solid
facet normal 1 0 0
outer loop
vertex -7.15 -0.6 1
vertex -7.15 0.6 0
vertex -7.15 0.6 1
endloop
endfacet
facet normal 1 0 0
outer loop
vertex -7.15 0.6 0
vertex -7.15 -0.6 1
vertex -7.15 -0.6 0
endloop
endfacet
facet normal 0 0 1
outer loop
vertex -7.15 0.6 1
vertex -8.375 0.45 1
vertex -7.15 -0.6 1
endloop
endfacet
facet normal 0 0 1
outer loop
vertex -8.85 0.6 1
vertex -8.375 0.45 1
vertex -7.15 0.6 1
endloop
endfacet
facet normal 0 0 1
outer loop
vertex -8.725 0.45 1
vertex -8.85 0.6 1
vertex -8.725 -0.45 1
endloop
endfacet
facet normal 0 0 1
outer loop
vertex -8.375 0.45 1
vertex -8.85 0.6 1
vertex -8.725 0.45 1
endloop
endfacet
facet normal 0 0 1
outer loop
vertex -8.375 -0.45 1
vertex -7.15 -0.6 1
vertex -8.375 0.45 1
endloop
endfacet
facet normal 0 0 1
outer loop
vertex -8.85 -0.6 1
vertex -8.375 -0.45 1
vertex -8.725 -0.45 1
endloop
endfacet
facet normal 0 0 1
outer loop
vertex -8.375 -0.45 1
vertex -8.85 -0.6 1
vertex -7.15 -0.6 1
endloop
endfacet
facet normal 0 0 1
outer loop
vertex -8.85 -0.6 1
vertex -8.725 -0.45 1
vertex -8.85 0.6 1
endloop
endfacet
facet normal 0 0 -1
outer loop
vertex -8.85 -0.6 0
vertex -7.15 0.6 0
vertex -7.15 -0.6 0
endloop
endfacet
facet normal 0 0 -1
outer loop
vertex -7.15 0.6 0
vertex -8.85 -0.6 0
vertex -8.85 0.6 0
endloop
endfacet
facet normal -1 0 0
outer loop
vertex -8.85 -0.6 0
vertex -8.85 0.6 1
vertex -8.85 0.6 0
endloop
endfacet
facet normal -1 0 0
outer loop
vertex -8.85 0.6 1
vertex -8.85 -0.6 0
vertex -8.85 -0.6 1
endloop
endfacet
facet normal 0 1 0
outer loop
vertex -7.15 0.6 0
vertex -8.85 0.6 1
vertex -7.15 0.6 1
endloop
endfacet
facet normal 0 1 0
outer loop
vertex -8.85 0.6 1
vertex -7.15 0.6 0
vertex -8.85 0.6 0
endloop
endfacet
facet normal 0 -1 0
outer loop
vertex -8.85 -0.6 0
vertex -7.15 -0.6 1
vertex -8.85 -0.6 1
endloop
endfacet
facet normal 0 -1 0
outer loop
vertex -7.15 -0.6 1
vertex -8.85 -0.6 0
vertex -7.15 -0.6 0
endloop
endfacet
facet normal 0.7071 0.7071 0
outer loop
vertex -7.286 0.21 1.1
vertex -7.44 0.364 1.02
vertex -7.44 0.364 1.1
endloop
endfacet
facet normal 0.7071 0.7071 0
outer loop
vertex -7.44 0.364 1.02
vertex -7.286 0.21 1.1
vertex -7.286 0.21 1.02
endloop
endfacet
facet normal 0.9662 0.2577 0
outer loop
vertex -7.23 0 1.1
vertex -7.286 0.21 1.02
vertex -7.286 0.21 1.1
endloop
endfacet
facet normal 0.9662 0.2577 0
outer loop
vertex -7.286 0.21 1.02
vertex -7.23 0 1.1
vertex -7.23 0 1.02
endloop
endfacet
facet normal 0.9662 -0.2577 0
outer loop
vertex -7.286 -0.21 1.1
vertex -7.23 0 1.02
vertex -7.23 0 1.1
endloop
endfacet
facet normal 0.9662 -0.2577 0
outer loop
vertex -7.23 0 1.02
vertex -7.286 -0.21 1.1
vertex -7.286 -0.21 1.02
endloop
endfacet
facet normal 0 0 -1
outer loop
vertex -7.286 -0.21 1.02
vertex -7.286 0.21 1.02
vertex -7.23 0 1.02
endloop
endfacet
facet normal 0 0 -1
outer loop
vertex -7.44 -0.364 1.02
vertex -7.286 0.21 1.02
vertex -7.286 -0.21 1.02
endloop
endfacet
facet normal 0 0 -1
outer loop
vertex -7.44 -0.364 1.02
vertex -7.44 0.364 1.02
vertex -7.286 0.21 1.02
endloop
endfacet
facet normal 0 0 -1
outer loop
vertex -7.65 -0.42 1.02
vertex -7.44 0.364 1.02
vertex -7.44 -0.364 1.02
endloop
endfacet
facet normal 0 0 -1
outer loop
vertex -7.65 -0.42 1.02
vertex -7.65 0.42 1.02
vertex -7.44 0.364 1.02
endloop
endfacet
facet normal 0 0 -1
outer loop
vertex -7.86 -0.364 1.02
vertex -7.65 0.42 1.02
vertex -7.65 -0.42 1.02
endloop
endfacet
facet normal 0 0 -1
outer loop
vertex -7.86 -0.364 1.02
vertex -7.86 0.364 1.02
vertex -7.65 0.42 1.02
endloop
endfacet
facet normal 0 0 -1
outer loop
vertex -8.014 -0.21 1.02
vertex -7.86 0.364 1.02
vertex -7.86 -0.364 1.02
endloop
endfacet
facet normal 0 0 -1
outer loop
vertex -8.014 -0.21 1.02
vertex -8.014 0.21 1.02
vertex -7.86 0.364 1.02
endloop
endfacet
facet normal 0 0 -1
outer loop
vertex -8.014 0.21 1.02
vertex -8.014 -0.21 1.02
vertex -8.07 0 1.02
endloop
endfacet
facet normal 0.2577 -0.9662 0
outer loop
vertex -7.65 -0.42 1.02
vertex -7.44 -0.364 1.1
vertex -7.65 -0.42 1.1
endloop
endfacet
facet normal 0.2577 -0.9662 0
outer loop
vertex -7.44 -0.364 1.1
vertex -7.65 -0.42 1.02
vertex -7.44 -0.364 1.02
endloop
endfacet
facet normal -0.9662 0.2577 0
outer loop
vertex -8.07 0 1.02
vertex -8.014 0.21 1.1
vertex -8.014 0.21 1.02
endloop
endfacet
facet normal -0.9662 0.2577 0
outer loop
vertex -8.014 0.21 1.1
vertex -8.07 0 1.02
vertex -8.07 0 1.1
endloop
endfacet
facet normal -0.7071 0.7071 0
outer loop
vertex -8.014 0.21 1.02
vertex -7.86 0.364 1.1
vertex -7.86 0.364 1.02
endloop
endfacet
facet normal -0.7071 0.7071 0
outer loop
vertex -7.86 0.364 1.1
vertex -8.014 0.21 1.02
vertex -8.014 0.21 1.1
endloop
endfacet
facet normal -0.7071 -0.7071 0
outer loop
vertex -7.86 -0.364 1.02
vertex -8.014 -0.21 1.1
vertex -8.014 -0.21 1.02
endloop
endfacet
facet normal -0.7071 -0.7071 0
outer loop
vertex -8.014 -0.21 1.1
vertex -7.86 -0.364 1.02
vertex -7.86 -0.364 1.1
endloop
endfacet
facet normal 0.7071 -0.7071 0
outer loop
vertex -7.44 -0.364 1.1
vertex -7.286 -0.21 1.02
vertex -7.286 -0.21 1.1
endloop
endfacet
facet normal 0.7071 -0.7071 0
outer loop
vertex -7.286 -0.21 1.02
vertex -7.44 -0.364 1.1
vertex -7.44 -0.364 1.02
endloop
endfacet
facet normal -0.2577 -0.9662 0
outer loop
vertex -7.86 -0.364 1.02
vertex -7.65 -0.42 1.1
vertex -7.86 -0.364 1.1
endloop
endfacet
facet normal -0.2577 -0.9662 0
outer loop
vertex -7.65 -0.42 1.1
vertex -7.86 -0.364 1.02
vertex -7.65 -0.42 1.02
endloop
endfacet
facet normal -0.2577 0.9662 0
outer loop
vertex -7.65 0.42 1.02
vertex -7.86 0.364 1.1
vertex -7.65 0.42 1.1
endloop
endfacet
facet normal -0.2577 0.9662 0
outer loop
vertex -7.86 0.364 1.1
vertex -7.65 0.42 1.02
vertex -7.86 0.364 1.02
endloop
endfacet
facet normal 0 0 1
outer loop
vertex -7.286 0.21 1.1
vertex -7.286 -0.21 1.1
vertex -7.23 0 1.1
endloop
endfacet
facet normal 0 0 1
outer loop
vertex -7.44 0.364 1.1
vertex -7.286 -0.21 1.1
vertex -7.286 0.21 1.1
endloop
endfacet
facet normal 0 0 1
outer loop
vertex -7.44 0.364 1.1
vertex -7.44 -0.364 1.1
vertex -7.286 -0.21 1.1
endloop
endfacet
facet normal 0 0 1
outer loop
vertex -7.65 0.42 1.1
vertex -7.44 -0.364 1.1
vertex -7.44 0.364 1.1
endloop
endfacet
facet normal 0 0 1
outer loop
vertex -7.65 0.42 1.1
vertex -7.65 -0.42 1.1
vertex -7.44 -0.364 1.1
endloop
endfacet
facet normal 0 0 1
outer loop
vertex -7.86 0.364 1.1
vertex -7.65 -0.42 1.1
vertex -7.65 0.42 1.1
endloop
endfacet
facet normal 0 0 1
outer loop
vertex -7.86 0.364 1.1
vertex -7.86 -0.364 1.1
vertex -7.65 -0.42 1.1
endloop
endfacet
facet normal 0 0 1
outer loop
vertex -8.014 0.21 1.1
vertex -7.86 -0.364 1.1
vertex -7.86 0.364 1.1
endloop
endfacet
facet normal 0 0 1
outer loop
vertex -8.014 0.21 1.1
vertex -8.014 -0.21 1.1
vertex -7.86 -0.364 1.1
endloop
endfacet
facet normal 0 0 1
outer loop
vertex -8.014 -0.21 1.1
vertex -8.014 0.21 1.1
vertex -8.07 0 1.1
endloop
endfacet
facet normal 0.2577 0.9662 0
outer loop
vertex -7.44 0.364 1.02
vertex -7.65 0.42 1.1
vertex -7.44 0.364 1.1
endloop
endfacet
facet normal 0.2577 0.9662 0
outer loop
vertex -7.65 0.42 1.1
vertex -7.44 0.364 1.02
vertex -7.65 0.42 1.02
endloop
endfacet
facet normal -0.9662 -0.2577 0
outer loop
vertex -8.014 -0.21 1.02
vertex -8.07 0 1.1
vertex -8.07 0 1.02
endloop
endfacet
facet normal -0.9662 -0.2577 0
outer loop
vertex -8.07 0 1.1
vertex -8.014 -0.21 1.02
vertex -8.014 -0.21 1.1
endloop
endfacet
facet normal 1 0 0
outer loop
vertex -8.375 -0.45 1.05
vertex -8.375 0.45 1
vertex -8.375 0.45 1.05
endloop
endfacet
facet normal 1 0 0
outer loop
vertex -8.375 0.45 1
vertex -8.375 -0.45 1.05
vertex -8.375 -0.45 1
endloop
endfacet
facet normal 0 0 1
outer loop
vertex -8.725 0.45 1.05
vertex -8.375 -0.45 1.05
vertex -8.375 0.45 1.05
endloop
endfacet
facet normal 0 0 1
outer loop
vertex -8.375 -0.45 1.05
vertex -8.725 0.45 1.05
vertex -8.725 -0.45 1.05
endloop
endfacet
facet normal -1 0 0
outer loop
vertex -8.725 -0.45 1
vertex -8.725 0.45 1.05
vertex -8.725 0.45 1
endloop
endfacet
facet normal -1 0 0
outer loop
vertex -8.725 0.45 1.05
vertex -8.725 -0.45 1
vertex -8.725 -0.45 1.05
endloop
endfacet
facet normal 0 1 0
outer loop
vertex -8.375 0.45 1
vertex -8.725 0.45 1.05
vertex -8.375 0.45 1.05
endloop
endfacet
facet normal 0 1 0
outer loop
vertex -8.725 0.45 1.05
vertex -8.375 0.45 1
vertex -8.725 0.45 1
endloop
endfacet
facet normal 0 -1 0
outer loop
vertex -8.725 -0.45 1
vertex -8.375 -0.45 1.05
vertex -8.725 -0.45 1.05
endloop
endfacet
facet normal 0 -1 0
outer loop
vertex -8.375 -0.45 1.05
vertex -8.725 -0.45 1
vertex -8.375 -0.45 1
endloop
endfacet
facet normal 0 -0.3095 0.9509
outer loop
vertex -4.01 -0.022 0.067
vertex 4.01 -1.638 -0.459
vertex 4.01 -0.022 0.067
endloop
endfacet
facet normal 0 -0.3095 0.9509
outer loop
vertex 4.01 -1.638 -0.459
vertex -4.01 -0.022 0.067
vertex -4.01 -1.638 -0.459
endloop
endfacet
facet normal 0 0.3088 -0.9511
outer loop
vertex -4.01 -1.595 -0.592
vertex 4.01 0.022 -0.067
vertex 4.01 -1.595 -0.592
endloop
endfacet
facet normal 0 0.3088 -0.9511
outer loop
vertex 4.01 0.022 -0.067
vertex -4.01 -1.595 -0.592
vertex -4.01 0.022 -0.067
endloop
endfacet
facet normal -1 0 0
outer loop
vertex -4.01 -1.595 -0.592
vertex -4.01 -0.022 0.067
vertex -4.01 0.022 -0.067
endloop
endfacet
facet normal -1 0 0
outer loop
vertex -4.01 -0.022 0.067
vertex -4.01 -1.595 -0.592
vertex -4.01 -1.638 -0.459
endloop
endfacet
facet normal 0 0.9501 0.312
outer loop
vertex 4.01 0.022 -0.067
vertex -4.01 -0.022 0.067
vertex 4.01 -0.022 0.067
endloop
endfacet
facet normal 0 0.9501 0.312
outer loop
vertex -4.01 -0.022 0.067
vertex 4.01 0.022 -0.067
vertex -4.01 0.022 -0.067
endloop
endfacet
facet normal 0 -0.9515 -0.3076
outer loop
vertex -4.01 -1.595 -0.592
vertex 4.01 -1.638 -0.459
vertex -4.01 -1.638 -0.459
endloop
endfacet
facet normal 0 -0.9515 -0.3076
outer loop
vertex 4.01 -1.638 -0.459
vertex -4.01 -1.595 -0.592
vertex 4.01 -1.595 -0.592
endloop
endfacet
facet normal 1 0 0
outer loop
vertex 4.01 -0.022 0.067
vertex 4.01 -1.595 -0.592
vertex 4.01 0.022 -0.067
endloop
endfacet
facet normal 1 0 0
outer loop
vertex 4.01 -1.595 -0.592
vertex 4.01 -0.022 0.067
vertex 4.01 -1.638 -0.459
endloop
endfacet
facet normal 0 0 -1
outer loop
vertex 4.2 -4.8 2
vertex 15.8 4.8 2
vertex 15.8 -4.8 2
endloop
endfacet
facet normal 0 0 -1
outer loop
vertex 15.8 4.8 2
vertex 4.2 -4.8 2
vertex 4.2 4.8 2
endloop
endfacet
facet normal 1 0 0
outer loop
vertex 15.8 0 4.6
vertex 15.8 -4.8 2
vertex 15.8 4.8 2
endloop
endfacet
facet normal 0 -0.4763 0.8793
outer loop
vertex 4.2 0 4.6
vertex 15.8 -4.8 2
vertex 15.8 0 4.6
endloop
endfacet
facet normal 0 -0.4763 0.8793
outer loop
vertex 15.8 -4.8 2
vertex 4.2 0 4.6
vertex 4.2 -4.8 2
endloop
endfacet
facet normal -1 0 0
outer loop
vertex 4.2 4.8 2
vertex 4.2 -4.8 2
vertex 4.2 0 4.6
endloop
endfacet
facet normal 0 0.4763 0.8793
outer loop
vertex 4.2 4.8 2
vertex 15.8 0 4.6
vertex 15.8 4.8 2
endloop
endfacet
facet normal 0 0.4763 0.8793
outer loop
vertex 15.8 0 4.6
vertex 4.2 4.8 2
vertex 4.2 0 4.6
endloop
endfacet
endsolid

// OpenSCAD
// ============================================================
// Modern City Diorama - 共享参数 / 配色 / 基础工具
// 单位近似：1 unit ≈ 1 米
// ============================================================

$fn = 24;

// ---- 地块总体尺寸 ----
function tile_w() = 230;     // X 方向
function tile_d() = 170;     // Y 方向
function base_h() = 2.2;     // 展台底座厚度

// ---- 道路网格 ----
function road_w() = 10;      // 双车道宽
function road_t() = 0.15;    // 路面厚
function curb_h() = 0.35;    // 街区台面(人行道)高
function vroads() = [-70, 0, 70];   // 纵向道路中心 x
function hroads() = [-40, 30];      // 横向道路中心 y

// ---- 配色（低多边形卡通风）----
function c_base()   = [0.78, 0.79, 0.80];
function c_pave()   = [0.88, 0.88, 0.86];
function c_road()   = [0.27, 0.29, 0.31];
function c_lot()    = [0.45, 0.47, 0.49];
function c_mark()   = [0.93, 0.93, 0.92];
function c_grass()  = [0.55, 0.78, 0.30];
function c_leaf()   = [0.45, 0.72, 0.22];
function c_leaf_d() = [0.33, 0.60, 0.18];
function c_trunk()  = [0.42, 0.28, 0.16];

function c_white()  = [0.95, 0.95, 0.94];
function c_cream()  = [0.95, 0.90, 0.77];
function c_beige()  = [0.90, 0.81, 0.66];
function c_grey()   = [0.63, 0.65, 0.67];
function c_dgrey()  = [0.36, 0.38, 0.40];
function c_dark()   = [0.16, 0.17, 0.18];

function c_red()    = [0.86, 0.22, 0.18];
function c_blue()   = [0.27, 0.56, 0.84];
function c_dblue()  = [0.15, 0.32, 0.55];
function c_orange() = [0.92, 0.58, 0.24];
function c_brown()  = [0.35, 0.23, 0.14];
function c_yellow() = [0.96, 0.78, 0.18];
function c_glass()  = [0.52, 0.72, 0.90];

// ---- 基础工具 ----
module boxc(s) { cube(s, center=true); }

// 置于 z=0 之上的平板
module slab(L, W, t) {
    translate([0, 0, t/2]) boxc([L, W, t]);
}

// 低多边形球（树冠等）
module blob(r) { sphere(r=r, $fn=8); }

// 屋顶女儿墙
module parapet(L, D, t=0.5, h=0.6) {
    difference() {
        translate([0, 0, h/2]) boxc([L, D, h]);
        translate([0, 0, h/2]) boxc([L - 2*t, D - 2*t, h + 0.2]);
    }
}

// 屋顶空调外机
module ac_unit() {
    color(c_grey())  translate([0, 0, 0.5]) boxc([1.7, 1.2, 1.0]);
    color(c_dgrey()) translate([0.35, 0, 1.02]) cylinder(h=0.08, r=0.42, $fn=12);
    color(c_dgrey()) translate([-0.55, 0, 1.02]) boxc([0.35, 0.9, 0.06]);
}

// 条纹遮阳棚：挂点在本地原点，向 -Y 出挑并下倾
module awning(W=8, D=1.7, ca=[0.86,0.22,0.18], cb=[0.95,0.95,0.94], n=6) {
    rotate([18, 0, 0])
    for (i = [0 : n-1]) {
        color(i % 2 == 0 ? ca : cb)
        translate([-W/2 + (i + 0.5)*W/n, -D/2, 0])
        boxc([W/n + 0.02, D, 0.14]);
    }
}

// 双坡屋顶（小住宅用）
module gable_roof(L=10, D=8, H=2.6, over=0.8, c=[0.86,0.22,0.18]) {
    color(c)
    polyhedron(
        points = [
            [-(L/2+over), -(D/2+over), 0],
            [ (L/2+over), -(D/2+over), 0],
            [ (L/2+over),  (D/2+over), 0],
            [-(L/2+over),  (D/2+over), 0],
            [-(L/2+over),  0,          H],
            [ (L/2+over),  0,          H]
        ],
        faces = [
            [0,1,2,3],
            [0,4,5,1],
            [3,2,5,4],
            [0,3,4],
            [1,5,2]
        ]
    );
}

// 标准预览
translate([-8, 0, 0]) ac_unit();
awning();
translate([10, 0, 2]) gable_roof();
